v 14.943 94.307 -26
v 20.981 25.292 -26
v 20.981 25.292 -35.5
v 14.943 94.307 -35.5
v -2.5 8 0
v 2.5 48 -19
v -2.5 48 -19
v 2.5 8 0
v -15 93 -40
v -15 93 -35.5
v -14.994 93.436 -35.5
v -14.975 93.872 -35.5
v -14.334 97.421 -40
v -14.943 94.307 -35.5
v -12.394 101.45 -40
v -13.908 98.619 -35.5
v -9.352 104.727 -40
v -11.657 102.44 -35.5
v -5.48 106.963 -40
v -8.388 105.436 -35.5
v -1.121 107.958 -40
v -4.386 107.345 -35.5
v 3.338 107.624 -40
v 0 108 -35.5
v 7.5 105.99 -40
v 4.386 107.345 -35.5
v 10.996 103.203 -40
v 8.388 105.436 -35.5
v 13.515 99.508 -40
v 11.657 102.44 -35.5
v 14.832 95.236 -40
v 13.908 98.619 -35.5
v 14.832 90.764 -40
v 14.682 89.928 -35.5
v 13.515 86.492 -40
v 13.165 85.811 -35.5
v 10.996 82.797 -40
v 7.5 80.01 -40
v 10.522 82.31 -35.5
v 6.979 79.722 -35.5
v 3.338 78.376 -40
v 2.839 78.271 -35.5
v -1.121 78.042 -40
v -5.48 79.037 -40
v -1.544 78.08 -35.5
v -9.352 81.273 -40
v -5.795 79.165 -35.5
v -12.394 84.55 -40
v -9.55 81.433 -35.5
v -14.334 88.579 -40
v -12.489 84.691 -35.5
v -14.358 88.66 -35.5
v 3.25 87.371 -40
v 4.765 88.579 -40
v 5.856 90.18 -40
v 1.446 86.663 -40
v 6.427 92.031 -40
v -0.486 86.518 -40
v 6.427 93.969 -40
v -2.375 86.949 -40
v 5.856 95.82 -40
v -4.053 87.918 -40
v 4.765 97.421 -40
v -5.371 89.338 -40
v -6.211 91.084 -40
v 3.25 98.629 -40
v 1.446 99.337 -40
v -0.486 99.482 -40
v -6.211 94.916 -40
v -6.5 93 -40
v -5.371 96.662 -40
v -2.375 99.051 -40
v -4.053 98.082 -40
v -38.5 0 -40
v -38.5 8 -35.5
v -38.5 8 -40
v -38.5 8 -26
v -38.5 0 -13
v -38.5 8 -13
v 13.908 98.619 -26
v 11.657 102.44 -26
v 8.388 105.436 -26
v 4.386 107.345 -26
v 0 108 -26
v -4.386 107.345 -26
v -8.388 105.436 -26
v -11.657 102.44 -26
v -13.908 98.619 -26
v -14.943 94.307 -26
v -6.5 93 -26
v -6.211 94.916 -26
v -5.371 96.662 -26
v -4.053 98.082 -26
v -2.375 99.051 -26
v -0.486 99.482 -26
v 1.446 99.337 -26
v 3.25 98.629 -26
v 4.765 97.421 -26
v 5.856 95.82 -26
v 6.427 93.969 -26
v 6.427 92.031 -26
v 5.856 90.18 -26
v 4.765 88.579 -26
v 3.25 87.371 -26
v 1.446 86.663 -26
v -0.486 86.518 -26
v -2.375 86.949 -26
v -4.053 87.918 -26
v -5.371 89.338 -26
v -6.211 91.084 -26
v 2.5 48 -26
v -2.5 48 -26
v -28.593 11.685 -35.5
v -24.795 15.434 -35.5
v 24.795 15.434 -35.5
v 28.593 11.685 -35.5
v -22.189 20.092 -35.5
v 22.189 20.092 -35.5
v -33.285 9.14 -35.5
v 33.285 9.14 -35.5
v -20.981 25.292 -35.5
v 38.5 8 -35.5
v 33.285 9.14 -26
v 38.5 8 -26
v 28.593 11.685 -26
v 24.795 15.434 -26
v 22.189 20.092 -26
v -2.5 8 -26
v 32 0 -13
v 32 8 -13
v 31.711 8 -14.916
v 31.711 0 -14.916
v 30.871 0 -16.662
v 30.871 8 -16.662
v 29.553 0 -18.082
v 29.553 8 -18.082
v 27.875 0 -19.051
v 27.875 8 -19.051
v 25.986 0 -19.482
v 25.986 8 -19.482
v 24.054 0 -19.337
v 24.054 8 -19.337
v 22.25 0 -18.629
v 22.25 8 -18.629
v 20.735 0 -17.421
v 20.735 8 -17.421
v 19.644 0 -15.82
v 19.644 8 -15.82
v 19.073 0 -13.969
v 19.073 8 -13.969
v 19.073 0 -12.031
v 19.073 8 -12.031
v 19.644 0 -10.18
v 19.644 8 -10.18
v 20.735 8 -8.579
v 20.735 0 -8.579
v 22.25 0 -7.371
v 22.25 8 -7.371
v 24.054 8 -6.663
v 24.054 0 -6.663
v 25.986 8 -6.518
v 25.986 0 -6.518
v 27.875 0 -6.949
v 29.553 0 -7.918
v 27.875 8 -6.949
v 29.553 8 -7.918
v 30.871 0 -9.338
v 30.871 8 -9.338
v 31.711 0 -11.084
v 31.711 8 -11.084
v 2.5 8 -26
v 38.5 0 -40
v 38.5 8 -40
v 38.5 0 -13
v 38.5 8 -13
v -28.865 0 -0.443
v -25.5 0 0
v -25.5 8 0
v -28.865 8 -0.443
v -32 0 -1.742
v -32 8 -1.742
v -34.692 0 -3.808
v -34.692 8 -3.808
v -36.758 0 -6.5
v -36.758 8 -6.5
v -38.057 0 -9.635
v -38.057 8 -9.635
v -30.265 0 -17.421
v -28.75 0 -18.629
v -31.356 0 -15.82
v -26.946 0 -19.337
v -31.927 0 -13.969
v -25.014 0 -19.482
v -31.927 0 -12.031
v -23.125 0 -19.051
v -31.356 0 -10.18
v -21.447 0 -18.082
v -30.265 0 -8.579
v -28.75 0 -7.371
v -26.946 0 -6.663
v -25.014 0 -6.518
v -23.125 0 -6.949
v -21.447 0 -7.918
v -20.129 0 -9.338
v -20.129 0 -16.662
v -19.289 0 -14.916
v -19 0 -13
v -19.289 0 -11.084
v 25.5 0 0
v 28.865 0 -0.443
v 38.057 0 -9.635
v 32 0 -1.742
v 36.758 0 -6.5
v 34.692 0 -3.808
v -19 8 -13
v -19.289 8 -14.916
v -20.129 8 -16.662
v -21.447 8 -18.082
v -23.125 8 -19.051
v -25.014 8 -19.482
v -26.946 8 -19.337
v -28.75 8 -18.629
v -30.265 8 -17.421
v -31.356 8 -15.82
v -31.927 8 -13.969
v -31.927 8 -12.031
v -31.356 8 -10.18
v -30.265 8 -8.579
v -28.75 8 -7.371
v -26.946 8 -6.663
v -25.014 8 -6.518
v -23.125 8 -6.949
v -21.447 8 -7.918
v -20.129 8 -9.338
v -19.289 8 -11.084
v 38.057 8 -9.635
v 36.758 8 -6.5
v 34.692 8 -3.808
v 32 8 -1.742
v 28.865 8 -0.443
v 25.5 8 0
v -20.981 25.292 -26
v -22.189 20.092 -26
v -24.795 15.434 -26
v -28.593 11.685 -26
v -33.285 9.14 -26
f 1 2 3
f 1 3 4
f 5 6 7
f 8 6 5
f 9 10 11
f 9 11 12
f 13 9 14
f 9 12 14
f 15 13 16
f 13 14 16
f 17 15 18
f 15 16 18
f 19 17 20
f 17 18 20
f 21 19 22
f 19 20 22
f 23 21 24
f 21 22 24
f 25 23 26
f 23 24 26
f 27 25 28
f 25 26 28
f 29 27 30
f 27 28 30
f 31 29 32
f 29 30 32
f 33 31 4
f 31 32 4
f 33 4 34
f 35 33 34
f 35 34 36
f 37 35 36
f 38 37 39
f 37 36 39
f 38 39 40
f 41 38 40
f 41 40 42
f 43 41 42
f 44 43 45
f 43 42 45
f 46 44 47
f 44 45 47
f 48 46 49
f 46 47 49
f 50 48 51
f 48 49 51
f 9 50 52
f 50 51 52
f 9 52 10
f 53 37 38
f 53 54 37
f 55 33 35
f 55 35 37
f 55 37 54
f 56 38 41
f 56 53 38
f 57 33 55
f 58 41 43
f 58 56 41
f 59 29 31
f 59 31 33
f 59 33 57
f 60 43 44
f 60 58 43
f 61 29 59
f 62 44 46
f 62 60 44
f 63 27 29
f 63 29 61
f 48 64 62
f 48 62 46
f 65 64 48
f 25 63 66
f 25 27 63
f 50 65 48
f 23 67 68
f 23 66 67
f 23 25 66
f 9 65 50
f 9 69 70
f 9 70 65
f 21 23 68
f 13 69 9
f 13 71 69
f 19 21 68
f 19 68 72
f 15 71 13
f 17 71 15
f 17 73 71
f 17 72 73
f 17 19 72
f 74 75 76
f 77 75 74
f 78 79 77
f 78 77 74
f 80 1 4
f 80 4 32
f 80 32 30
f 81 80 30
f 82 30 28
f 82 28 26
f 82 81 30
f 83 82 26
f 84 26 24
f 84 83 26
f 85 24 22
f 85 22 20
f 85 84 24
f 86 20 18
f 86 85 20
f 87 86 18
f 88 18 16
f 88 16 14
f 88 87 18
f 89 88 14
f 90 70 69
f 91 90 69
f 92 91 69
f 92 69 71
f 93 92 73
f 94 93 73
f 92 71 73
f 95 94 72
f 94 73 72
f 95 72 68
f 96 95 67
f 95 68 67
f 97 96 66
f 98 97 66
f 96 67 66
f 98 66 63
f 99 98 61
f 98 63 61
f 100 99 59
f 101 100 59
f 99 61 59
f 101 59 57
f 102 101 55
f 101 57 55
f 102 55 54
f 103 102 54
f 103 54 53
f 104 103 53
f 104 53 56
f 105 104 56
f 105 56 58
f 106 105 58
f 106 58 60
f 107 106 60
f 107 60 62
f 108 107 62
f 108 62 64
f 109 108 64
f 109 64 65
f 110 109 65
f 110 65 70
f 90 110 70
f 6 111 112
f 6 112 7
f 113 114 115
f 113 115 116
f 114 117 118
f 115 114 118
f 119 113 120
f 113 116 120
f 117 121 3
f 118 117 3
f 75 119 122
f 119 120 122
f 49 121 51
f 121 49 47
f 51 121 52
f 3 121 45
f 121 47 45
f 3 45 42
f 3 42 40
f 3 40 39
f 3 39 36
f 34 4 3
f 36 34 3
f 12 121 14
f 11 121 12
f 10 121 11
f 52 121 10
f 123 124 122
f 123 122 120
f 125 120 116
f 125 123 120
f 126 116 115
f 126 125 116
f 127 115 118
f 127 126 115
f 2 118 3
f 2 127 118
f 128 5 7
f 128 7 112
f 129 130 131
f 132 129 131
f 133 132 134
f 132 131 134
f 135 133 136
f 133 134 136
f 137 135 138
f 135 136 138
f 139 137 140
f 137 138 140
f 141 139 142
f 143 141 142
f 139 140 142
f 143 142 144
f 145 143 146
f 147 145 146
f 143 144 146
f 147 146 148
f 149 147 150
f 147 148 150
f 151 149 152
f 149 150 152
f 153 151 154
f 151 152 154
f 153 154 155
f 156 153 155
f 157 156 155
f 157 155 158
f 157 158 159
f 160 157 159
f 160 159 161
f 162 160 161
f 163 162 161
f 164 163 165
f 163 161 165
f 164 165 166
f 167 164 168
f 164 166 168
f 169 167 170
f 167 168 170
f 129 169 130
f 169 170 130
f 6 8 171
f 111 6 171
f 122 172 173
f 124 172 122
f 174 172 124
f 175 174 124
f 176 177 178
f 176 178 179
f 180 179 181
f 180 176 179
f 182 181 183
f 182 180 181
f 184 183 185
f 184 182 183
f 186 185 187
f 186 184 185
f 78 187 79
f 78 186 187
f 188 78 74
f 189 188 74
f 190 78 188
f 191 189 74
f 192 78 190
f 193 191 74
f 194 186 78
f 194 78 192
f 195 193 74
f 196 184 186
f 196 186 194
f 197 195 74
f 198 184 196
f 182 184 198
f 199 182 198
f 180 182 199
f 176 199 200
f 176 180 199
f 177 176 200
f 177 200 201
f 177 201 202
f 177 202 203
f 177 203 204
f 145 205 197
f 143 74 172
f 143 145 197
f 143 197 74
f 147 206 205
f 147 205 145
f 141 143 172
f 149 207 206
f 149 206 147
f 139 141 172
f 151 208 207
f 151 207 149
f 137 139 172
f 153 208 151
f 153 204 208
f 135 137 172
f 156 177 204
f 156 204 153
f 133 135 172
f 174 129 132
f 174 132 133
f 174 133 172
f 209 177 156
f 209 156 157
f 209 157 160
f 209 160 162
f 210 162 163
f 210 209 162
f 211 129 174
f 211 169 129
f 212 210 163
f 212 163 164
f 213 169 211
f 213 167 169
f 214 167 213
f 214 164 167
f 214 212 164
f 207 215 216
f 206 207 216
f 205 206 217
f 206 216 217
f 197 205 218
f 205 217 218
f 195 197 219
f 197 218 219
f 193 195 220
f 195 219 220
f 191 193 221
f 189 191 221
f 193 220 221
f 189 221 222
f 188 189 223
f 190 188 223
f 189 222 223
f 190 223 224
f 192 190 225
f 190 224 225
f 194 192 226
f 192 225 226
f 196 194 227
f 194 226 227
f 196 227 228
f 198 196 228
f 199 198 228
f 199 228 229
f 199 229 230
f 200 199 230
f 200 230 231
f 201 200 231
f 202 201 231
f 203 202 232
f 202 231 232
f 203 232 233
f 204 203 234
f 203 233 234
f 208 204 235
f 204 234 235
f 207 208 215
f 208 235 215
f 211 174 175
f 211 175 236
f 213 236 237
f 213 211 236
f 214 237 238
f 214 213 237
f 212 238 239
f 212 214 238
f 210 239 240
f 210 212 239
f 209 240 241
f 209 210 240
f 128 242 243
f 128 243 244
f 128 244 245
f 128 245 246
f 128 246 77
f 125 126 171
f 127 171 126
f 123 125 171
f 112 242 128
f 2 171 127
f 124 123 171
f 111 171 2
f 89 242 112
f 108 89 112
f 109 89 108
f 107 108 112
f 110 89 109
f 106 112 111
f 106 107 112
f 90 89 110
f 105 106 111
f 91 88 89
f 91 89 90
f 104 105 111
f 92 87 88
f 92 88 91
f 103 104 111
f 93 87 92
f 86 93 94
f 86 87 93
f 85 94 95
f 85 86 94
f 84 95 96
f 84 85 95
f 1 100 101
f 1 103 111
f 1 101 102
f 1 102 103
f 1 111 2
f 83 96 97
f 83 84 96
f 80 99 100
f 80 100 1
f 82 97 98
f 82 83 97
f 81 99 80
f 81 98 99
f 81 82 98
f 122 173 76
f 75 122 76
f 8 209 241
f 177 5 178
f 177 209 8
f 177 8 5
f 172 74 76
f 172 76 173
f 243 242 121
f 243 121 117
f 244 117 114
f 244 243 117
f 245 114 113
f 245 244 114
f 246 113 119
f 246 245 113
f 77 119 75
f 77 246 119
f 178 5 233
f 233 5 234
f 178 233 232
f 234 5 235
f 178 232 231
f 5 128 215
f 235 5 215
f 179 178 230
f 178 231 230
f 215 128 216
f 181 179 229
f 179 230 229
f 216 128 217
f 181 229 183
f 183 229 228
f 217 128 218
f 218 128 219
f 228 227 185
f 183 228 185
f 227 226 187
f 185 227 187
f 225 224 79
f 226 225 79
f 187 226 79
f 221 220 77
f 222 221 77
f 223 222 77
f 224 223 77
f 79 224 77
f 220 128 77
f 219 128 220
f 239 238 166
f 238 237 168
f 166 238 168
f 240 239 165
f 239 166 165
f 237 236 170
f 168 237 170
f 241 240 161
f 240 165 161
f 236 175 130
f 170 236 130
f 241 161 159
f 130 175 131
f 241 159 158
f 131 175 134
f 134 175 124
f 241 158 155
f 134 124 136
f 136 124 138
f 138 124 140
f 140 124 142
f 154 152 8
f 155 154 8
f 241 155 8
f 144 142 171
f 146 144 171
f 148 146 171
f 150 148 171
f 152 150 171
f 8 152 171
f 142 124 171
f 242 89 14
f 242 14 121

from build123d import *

# Parameters (mm, degrees)
EXTRUDE_1_DEPTH     = 8
SKETCH_2_R          = 6.5
CUT_EXTRUDE_1_DEPTH = 8
EXTRUDE_2_DEPTH     = 9.5
SKETCH_4_R          = 15
EXTRUDE_3_DEPTH     = 4.5
SKETCH_5_R          = 6.5
CUT_EXTRUDE_2_DEPTH = 41
EXTRUDE_4_DEPTH     = 2.5


with BuildPart() as part:
    # 스케치1 → 보스-돌출1 (new body)
    with BuildSketch(Plane(origin=(0, 0, 0), x_dir=(1, 0, 0), z_dir=(0, 1, 0))):
        with BuildLine():
            Line((-38.5, 40), (38.5, 40))
            Line((38.5, 40), (38.5, 13))
            ThreePointArc((38.5, 13), (34.692388155, 3.807611845), (25.5, 0))
            Line((25.5, 0), (-25.5, 0))
            ThreePointArc((-25.5, 0), (-34.692388155, 3.807611845), (-38.5, 13))
            Line((-38.5, 13), (-38.5, 40))
        make_face()
    extrude(amount=EXTRUDE_1_DEPTH)

    # 스케치2 → 컷-돌출1 (cut)
    with BuildSketch(Plane(origin=(0, 8, 0), x_dir=(1, 0, 0), z_dir=(0, 1, 0))):
        with Locations((-25.5, 13)):
            Circle(SKETCH_2_R)
        with Locations((25.5, 13)):
            Circle(SKETCH_2_R)
    extrude(amount=-CUT_EXTRUDE_1_DEPTH, mode=Mode.SUBTRACT)

    # 스케치3 → 보스-돌출2 (add)
    with BuildSketch(Plane(origin=(0, 0, -26), x_dir=(-1, 0, 0), z_dir=(0, 0, -1))):
        with BuildLine():
            Line((-38.5, 0), (-38.5, 8))
            ThreePointArc((-38.5, 8), (-26.561663341, 13.425258865), (-20.981002143, 25.291746827))
            Line((-20.981002143, 25.291746827), (-14.942920471, 94.307336141))
            ThreePointArc((-14.942920471, 94.307336141), (0, 108), (14.942920471, 94.307336141))
            Line((14.942920471, 94.307336141), (20.981002143, 25.291746827))
            ThreePointArc((20.981002143, 25.291746827), (26.561663341, 13.425258865), (38.5, 8))
            Line((38.5, 8), (38.5, 0))
            Line((38.5, 0), (-38.5, 0))
        make_face()
    extrude(amount=EXTRUDE_2_DEPTH)

    # 스케치4 → 보스-돌출3 (add)
    with BuildSketch(Plane(origin=(0, 0, -35.5), x_dir=(-1, 0, 0), z_dir=(0, 0, -1))):
        with Locations((0, 93)):
            Circle(SKETCH_4_R)
    extrude(amount=EXTRUDE_3_DEPTH)

    # 스케치5 → 컷-돌출2 (cut, through all)
    with BuildSketch(Plane(origin=(0, 0, -40), x_dir=(-1, 0, 0), z_dir=(0, 0, -1))):
        with Locations((0, 93)):
            Circle(SKETCH_5_R)
    extrude(amount=-CUT_EXTRUDE_2_DEPTH, mode=Mode.SUBTRACT)

    # 스케치7 → 보스-돌출4 (add, symmetric)
    with BuildSketch(Plane(origin=(0, 0, 0), x_dir=(0, 0, -1), z_dir=(1, 0, 0))):
        Polygon((0, 8), (35.5, 8), (35.5, 48), (19, 48), align=None)
    extrude(amount=EXTRUDE_4_DEPTH, both=True)


solid = part.part
